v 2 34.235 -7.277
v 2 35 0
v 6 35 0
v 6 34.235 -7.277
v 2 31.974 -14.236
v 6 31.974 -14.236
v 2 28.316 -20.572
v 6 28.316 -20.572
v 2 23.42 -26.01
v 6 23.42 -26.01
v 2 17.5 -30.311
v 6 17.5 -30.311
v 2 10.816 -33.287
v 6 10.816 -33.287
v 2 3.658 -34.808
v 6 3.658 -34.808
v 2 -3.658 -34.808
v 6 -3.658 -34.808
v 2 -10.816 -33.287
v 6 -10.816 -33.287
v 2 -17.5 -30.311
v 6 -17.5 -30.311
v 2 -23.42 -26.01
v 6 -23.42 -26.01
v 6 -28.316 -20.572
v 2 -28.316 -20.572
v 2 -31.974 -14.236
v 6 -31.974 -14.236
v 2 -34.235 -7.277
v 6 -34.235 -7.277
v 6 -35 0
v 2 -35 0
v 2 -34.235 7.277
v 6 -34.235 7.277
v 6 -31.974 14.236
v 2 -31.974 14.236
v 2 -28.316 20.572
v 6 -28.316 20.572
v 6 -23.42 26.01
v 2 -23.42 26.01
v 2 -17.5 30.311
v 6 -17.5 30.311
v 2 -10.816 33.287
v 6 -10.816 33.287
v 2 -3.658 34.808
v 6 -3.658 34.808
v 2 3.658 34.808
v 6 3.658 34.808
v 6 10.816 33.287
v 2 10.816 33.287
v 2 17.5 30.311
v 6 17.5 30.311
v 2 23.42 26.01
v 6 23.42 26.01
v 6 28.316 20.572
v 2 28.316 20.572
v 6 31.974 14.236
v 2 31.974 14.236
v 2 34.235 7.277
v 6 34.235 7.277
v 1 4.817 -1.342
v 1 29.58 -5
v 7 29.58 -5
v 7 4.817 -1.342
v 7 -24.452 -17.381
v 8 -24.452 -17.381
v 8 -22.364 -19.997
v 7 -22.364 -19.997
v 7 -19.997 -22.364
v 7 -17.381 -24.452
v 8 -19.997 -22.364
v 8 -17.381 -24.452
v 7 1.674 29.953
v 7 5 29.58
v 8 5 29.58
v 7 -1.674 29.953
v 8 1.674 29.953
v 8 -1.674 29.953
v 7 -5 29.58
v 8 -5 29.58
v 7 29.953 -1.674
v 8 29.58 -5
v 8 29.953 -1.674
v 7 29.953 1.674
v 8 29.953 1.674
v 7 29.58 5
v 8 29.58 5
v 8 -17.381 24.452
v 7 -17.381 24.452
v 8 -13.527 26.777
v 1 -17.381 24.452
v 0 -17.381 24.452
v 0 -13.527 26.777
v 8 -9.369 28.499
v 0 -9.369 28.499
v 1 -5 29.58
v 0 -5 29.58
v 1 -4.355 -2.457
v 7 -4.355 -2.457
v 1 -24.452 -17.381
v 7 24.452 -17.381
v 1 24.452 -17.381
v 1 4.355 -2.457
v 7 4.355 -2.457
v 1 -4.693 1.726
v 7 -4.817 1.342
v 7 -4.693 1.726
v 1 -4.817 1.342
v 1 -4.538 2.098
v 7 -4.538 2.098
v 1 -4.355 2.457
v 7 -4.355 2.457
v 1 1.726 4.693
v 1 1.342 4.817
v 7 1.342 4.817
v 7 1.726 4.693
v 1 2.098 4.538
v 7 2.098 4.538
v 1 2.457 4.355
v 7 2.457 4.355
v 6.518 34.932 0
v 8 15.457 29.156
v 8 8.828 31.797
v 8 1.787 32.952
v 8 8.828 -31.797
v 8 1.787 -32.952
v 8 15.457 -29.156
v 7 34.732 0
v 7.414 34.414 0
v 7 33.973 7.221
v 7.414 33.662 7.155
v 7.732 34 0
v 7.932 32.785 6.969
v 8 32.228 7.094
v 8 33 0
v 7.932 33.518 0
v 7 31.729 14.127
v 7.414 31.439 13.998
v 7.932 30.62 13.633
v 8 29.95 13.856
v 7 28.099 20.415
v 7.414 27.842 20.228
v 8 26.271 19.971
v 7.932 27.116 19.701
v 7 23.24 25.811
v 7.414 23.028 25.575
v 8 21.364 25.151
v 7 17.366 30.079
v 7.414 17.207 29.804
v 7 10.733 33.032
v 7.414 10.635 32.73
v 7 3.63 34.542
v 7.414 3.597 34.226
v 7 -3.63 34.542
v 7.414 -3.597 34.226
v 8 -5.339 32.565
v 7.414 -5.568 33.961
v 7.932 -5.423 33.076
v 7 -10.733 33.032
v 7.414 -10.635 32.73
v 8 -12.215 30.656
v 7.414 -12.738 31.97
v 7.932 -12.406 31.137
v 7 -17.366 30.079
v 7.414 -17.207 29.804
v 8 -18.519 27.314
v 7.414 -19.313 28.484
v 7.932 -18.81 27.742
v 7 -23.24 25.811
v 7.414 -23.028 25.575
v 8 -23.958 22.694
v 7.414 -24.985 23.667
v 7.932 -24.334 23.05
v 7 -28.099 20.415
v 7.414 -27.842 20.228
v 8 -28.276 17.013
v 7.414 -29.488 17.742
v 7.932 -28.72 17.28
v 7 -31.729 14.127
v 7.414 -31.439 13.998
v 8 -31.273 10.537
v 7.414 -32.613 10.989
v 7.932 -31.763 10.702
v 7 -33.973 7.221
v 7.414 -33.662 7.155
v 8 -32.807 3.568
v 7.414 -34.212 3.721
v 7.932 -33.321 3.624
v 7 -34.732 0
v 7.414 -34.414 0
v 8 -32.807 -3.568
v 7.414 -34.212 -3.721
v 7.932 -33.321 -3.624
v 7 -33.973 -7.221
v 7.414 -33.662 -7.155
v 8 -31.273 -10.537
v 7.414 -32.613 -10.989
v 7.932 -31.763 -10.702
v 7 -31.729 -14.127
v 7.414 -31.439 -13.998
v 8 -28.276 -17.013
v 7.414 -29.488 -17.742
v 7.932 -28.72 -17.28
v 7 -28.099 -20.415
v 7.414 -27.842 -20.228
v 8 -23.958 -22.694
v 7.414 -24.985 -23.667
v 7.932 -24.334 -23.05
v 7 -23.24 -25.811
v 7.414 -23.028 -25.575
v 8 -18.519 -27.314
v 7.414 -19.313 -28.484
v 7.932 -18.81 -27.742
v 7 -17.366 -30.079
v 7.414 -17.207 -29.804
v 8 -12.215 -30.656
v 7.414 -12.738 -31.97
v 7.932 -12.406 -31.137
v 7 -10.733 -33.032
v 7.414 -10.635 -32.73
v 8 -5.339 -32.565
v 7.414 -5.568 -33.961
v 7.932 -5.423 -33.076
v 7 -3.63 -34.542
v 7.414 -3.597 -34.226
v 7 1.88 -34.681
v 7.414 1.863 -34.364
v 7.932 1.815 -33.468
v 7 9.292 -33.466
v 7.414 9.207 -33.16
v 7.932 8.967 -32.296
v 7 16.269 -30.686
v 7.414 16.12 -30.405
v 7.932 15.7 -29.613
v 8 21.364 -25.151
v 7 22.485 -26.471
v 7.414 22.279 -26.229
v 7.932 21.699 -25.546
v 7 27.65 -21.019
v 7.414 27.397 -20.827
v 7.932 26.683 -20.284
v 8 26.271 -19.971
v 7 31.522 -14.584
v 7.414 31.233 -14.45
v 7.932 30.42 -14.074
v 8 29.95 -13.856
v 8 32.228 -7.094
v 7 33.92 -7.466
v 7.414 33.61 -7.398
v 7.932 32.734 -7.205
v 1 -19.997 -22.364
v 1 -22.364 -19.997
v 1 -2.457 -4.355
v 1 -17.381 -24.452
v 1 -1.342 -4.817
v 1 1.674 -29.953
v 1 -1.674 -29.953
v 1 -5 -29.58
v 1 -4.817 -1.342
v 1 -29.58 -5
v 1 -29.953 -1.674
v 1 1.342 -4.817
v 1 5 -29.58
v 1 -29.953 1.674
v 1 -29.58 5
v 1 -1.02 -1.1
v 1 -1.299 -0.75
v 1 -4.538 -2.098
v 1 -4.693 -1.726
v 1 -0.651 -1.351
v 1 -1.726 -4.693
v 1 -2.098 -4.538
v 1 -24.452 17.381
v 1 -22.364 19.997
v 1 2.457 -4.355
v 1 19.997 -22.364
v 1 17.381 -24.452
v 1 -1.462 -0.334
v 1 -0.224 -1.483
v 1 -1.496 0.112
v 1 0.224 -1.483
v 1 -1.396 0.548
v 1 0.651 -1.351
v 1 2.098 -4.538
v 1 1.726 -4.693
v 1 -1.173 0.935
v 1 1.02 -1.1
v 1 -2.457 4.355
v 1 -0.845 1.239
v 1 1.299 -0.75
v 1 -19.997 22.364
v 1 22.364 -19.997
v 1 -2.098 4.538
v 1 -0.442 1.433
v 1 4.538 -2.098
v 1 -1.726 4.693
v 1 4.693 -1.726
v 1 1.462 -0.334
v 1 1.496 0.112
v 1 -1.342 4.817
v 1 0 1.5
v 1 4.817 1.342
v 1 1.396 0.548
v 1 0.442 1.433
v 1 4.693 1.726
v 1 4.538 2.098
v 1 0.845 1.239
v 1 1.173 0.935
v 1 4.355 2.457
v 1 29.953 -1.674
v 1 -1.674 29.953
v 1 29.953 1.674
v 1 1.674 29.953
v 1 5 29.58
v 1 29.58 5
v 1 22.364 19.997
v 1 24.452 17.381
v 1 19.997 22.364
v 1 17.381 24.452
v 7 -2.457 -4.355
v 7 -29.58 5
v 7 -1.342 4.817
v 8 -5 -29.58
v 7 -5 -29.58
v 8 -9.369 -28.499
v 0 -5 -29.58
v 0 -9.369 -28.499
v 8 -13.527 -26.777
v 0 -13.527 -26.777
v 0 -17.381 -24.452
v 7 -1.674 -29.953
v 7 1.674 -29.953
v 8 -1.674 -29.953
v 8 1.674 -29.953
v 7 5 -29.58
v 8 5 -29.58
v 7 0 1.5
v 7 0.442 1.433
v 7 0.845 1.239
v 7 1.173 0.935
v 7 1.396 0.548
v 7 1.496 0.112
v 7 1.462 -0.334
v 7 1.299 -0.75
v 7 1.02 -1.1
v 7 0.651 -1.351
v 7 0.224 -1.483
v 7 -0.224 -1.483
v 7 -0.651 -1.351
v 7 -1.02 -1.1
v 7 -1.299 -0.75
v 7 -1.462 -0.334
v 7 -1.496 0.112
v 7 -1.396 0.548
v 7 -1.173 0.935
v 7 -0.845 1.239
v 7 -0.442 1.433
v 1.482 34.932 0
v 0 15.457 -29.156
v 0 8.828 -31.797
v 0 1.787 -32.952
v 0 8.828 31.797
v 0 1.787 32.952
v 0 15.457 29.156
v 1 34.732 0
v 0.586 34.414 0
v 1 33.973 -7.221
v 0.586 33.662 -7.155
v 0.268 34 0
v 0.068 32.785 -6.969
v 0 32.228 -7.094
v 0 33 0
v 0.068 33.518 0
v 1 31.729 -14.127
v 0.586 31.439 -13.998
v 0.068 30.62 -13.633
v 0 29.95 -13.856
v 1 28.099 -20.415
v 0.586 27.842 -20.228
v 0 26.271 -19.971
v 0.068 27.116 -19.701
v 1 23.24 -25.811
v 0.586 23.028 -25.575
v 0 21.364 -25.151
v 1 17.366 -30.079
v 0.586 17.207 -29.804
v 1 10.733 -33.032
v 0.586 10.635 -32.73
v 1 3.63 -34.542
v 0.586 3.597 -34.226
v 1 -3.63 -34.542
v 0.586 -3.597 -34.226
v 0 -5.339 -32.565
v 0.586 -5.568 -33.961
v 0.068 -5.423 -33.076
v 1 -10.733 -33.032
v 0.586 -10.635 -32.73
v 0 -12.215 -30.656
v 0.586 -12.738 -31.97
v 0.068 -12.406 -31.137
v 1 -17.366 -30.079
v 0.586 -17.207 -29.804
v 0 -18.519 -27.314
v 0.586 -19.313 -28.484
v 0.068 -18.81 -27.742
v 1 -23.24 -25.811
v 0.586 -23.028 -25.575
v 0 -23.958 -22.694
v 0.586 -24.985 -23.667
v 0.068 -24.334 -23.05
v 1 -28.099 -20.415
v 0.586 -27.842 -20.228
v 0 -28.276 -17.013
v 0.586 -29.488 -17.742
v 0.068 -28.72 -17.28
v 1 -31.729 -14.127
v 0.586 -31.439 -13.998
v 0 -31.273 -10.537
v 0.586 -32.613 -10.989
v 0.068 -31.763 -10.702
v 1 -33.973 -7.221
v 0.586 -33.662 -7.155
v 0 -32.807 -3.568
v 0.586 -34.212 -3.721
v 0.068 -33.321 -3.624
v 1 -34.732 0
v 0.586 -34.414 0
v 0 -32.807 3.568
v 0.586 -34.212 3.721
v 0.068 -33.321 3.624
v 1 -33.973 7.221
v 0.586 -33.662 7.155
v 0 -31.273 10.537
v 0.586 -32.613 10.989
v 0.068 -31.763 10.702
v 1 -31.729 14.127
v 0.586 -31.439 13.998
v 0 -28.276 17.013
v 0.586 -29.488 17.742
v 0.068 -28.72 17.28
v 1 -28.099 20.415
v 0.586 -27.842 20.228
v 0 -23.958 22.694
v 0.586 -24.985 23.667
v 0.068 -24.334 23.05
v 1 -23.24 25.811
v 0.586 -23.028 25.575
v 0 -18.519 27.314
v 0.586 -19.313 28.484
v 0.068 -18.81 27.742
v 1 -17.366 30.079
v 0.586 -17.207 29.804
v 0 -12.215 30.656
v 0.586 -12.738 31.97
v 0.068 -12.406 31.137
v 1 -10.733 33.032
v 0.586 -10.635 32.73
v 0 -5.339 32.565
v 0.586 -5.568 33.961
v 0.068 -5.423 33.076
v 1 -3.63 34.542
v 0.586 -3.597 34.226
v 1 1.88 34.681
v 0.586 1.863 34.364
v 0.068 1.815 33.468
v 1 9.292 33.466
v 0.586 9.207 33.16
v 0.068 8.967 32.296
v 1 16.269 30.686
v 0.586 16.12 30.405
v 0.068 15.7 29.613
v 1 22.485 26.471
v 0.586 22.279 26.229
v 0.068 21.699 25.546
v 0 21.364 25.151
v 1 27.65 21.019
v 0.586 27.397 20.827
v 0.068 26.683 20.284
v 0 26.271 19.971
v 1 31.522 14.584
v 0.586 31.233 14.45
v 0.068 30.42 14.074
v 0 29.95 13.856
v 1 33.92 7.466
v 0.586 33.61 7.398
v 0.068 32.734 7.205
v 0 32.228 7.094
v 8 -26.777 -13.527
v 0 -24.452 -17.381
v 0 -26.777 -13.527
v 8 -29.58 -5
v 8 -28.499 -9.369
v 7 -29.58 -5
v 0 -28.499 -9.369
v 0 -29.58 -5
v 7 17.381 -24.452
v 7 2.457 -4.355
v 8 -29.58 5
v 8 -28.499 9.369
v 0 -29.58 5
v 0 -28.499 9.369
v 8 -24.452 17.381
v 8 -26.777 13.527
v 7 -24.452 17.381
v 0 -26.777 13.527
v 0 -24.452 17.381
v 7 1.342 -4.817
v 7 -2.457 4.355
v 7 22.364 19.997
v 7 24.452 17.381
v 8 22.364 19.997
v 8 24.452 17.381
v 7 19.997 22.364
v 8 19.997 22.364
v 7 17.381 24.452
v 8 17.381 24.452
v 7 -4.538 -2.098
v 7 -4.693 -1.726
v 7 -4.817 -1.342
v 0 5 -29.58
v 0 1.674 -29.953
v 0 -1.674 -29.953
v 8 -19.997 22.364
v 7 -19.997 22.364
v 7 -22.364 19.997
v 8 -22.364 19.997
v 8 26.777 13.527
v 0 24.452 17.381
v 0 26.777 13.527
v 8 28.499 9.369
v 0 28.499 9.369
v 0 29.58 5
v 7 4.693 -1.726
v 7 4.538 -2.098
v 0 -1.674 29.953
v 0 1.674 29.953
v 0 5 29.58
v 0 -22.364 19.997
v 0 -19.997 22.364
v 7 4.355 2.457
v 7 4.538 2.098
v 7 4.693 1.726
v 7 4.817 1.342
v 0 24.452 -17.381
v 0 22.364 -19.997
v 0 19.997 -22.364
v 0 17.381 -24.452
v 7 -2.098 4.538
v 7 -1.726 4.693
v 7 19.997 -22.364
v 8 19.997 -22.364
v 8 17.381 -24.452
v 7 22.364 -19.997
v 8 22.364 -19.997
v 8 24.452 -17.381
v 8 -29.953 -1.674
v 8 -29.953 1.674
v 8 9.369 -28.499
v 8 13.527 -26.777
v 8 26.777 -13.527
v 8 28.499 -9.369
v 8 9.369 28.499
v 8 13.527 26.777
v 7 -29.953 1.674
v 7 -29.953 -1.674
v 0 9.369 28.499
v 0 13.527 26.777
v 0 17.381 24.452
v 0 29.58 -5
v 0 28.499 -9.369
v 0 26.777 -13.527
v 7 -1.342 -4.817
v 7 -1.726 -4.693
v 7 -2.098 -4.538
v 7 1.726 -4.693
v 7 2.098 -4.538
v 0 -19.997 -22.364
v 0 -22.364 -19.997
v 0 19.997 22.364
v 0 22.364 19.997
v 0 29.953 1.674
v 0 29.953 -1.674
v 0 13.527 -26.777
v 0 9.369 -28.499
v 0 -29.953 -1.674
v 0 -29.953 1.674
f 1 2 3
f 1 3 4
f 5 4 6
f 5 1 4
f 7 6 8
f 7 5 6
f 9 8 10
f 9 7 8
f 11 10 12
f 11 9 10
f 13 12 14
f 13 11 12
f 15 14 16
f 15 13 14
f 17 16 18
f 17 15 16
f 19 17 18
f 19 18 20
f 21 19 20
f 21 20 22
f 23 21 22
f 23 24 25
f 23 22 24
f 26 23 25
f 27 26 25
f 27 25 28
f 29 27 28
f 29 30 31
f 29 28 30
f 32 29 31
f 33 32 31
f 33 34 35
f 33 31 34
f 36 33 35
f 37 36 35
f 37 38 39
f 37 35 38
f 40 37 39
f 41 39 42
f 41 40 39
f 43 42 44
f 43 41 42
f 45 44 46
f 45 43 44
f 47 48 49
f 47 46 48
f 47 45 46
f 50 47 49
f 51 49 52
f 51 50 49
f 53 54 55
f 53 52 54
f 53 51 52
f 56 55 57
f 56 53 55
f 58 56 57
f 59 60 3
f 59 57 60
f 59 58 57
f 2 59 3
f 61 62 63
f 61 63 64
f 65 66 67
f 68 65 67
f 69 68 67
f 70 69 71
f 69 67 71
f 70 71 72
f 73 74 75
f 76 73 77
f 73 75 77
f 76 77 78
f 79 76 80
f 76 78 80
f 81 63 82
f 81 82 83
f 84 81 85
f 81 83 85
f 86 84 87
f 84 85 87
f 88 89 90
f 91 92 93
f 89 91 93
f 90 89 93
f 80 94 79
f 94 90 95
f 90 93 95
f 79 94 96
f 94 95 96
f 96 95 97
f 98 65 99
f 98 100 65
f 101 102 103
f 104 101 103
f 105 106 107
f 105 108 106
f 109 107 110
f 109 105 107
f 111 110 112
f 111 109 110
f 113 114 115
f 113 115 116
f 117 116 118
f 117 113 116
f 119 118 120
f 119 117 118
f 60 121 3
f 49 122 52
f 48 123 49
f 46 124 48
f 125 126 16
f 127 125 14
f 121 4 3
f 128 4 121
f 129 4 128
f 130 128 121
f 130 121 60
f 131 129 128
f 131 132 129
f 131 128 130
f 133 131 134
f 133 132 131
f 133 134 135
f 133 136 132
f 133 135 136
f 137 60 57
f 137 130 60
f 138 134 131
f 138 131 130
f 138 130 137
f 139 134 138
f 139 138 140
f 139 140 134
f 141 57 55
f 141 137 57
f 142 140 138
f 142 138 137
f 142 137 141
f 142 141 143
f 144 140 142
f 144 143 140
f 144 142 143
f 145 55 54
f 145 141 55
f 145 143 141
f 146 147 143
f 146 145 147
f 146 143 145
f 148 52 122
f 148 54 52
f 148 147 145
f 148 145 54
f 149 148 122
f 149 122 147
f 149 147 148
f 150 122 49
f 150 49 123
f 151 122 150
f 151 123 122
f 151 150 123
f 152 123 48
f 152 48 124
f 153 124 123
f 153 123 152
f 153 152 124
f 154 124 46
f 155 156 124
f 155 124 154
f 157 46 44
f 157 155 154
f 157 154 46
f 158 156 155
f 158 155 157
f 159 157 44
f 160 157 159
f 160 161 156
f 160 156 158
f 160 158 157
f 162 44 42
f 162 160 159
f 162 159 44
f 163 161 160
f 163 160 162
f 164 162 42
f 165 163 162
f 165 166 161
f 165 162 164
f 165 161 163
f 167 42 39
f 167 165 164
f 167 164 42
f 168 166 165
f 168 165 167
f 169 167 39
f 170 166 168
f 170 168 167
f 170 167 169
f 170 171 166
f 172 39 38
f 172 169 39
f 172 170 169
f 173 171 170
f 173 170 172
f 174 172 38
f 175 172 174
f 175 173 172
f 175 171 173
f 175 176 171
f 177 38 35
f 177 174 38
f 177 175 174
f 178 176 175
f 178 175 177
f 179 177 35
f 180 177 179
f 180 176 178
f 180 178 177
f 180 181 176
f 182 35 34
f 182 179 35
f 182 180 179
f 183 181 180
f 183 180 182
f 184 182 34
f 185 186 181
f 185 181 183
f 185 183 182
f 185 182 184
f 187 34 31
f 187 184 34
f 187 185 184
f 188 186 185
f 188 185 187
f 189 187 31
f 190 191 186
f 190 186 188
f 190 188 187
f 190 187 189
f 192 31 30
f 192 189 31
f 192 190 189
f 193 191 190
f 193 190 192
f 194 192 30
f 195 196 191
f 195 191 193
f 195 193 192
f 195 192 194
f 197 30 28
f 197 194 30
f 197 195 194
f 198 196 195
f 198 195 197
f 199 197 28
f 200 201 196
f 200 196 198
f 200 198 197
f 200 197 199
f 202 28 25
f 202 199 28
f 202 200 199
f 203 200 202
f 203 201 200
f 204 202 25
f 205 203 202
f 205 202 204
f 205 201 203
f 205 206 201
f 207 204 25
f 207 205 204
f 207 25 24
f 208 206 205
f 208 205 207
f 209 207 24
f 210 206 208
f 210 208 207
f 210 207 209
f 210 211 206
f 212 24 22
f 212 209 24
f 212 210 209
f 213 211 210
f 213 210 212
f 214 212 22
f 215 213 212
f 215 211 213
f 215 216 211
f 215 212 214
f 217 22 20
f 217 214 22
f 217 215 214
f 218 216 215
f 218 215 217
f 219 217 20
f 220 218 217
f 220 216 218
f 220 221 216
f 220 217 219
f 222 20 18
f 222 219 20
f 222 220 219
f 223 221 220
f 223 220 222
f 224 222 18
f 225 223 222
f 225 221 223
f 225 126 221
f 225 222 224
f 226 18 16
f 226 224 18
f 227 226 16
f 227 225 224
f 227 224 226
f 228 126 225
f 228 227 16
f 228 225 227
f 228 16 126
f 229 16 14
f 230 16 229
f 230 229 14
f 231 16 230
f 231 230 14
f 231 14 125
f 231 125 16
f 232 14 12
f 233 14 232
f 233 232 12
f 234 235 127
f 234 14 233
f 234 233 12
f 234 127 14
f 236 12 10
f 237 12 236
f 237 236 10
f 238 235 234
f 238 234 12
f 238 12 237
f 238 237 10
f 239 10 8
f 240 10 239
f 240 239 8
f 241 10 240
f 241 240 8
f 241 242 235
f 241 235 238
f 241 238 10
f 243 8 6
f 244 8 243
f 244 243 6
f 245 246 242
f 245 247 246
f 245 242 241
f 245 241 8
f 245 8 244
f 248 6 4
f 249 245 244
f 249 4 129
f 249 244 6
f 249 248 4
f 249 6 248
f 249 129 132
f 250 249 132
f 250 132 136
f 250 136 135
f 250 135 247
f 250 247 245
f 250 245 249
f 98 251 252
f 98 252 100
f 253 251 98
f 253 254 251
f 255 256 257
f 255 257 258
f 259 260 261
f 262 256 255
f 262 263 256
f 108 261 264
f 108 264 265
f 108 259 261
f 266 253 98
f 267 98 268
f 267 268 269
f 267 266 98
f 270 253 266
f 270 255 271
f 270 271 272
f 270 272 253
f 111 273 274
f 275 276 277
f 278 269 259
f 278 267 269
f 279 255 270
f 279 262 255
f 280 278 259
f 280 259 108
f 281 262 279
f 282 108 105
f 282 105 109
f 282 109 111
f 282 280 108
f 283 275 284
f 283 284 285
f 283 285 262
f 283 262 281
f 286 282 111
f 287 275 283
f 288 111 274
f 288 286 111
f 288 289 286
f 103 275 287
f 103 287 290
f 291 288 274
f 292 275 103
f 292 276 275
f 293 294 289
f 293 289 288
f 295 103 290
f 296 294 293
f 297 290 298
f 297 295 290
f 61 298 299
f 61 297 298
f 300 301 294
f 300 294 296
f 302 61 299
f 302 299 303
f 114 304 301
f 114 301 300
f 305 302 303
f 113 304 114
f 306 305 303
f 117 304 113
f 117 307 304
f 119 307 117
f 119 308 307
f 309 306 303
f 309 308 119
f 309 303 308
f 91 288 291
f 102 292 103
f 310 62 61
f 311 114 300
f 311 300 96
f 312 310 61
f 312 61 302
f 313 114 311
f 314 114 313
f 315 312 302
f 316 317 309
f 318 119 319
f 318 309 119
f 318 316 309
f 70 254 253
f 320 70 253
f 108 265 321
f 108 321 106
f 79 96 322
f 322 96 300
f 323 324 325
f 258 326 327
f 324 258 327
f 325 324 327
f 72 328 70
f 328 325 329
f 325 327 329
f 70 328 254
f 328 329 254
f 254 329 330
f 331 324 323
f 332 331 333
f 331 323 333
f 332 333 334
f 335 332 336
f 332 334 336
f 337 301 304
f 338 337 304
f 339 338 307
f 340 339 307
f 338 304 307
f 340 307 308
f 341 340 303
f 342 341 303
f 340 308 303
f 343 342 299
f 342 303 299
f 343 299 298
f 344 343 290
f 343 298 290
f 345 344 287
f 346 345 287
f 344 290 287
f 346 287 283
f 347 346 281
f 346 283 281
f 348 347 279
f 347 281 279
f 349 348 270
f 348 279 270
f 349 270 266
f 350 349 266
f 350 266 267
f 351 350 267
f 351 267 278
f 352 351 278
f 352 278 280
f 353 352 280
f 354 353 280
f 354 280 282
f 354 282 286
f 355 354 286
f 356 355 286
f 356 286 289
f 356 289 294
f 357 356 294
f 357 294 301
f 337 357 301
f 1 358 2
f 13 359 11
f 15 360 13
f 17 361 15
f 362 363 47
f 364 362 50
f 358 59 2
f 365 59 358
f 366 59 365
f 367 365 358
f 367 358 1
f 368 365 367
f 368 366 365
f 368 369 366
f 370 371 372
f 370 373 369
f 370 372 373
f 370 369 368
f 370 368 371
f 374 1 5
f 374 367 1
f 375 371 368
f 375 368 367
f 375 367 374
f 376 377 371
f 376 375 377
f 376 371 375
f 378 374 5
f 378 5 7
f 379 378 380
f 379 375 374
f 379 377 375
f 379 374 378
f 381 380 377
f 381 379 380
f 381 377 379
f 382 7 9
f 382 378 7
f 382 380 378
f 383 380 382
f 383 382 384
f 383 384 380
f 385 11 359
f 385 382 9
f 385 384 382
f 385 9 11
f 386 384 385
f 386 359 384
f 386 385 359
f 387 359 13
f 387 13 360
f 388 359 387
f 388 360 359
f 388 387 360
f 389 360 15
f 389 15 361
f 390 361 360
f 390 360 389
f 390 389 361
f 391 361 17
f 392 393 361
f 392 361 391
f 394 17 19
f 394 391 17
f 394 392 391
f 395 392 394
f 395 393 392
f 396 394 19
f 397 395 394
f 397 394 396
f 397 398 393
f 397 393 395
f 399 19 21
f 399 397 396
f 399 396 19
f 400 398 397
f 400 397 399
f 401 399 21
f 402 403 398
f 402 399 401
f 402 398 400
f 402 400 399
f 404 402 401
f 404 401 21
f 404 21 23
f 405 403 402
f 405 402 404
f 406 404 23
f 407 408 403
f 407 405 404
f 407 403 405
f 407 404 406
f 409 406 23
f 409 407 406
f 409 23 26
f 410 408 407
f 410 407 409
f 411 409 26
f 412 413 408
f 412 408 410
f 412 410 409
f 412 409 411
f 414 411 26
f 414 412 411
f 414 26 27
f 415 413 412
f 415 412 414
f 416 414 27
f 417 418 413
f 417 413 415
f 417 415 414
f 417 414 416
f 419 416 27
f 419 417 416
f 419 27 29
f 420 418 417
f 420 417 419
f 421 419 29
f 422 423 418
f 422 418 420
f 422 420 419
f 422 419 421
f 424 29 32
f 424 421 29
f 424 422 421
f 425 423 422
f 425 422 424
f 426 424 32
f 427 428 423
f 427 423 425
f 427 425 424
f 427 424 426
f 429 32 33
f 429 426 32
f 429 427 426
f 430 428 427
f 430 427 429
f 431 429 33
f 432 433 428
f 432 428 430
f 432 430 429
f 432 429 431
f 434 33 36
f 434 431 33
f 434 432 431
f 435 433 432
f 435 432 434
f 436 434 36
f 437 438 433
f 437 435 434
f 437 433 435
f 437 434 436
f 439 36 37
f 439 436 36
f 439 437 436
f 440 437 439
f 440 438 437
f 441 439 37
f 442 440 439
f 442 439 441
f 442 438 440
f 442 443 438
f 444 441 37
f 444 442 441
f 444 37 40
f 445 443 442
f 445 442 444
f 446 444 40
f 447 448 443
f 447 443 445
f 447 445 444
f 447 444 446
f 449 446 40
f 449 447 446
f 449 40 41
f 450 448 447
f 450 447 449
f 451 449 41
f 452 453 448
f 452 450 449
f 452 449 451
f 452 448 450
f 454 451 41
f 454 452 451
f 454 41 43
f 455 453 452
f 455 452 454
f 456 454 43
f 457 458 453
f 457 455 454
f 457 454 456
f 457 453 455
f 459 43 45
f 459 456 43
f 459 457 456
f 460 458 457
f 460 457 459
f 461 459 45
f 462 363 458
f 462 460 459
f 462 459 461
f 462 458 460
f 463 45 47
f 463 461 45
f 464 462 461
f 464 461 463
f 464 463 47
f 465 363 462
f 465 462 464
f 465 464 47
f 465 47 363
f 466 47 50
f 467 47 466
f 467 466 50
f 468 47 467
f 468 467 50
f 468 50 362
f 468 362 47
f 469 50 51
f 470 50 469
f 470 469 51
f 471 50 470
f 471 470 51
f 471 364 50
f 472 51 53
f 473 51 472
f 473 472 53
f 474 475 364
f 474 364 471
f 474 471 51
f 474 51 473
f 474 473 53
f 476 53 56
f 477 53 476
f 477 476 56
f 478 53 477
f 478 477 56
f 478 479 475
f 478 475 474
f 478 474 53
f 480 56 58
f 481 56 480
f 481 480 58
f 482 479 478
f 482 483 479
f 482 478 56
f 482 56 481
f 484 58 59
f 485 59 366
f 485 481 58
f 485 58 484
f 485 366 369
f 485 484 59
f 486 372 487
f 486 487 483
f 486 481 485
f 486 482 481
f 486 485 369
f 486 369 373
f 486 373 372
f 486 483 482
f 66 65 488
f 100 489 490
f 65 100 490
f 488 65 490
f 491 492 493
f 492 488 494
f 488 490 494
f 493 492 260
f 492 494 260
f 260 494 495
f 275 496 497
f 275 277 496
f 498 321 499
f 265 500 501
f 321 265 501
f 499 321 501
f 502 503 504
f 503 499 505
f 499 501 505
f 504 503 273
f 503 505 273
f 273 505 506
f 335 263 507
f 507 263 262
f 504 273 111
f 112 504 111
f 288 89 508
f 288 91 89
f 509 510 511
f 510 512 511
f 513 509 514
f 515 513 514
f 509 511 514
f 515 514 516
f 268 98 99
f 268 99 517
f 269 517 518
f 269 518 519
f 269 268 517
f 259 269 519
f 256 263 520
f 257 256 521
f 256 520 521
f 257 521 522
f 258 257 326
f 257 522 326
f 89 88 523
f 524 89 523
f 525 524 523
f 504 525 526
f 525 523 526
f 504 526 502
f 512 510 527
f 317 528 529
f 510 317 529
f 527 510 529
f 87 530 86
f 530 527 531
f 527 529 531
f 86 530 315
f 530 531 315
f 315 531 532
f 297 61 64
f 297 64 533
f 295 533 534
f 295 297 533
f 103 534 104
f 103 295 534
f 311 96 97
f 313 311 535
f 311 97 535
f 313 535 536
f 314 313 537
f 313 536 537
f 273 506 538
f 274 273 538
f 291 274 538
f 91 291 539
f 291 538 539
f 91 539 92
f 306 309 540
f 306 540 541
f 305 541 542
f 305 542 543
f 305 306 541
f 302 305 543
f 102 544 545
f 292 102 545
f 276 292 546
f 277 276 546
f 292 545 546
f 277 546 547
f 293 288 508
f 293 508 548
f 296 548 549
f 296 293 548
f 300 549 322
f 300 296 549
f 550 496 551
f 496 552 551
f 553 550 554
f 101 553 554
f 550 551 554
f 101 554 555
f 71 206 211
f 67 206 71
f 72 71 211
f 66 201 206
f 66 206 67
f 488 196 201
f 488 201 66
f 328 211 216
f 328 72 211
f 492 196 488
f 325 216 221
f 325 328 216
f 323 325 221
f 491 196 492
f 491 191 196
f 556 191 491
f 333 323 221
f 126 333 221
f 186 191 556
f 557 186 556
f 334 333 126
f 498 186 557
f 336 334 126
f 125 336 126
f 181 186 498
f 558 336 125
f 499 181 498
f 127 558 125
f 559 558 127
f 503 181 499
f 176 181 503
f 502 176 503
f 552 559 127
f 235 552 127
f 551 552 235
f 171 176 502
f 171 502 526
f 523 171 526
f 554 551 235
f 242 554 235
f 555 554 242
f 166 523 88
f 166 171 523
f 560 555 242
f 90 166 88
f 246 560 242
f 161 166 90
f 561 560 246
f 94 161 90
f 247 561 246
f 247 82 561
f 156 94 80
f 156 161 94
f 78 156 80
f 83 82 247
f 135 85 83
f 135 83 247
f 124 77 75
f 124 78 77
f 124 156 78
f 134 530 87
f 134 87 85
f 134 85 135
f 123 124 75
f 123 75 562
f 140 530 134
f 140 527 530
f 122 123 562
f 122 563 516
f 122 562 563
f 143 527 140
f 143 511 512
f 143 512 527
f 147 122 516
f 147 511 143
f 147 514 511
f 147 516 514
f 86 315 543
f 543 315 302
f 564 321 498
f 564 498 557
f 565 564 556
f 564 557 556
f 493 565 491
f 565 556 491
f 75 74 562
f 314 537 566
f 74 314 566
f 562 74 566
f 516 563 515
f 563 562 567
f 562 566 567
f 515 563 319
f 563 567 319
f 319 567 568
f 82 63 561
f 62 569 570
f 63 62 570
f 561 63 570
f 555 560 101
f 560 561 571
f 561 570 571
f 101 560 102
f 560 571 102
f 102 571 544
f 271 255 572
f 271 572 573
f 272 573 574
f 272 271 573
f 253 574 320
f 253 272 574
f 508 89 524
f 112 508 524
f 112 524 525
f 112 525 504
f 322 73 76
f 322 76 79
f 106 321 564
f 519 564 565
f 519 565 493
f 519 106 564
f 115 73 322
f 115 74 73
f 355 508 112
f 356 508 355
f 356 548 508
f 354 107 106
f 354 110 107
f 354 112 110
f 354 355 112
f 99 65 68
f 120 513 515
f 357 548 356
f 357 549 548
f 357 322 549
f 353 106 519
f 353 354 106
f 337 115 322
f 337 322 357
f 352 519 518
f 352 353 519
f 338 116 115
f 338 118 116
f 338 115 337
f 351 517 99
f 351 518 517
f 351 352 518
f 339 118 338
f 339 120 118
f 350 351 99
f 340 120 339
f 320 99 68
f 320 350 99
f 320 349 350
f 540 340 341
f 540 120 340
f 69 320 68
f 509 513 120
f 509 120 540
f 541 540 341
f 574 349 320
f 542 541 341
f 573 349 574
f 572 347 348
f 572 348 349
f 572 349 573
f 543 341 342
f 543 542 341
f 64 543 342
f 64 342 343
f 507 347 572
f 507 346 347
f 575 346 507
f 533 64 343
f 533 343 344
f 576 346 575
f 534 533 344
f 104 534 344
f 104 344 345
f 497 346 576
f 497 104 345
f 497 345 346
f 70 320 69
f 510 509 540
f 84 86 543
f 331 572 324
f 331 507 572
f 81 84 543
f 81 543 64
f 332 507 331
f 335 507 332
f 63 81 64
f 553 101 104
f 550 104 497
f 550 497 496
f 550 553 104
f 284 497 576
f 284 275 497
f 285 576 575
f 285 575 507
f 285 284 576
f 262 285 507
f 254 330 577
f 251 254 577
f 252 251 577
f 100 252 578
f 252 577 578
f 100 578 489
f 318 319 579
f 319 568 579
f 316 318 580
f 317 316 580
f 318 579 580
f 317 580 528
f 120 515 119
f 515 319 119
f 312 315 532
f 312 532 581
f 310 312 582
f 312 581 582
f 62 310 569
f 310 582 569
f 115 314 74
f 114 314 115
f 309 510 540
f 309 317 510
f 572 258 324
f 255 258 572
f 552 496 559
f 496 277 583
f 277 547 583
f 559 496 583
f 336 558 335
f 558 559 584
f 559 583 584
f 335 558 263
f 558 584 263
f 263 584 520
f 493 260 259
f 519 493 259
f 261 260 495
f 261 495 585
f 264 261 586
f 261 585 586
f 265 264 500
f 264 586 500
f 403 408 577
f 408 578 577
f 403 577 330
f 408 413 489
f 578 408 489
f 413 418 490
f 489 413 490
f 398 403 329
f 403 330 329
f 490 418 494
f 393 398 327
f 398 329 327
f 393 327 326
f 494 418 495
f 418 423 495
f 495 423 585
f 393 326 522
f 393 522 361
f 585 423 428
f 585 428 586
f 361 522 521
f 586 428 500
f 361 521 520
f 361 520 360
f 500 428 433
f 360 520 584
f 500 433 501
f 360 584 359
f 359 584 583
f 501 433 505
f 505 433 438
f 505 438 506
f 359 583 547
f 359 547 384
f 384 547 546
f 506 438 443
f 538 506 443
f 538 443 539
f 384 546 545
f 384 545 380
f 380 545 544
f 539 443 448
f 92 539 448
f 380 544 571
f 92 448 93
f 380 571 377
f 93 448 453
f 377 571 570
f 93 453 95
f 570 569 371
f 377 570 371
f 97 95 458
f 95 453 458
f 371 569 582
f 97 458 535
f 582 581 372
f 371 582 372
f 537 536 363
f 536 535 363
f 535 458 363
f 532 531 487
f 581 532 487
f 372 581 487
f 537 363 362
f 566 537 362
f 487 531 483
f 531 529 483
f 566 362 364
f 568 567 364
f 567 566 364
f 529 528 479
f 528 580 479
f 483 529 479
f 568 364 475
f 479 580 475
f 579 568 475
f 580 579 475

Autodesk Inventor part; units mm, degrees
ref_plane "YZ Plane" through (0, 0, 0) normal (1, 0, 0) x (0, 1, 0)
ref_plane "XZ Plane" through (0, 0, 0) normal (0, 1, 0) x (-1, 0, 0)
ref_plane "XY Plane" through (0, 0, 0) normal (0, 0, 1) x (1, 0, 0)
sketch "Sketch1" plane through (0, 0, 0) normal (1, 0, 0) x (0, 1, 0)
  circle A0 centre (0, 0) radius 35
  line L0 (29.5804, -5) -> (4.8166, -1.3417)
  line L1 (36.6755, 0) -> (35, 0)
  line L2 (29.5804, 5) -> (4.8166, 1.3417)
  line L3 (17.381, 24.452) -> (2.4572, 4.3546)
  line L4 (24.452, 17.381) -> (4.3546, 2.4572)
  line L5 (-5, 29.5804) -> (-1.3417, 4.8166)
  line L6 (5, 29.5804) -> (1.3417, 4.8166)
  line L7 (-24.452, 17.381) -> (-4.3546, 2.4572)
  line L8 (-17.381, 24.452) -> (-2.4572, 4.3546)
  line L9 (-29.5804, -5) -> (-4.8166, -1.3417)
  line L10 (-29.5804, 5) -> (-4.8166, 1.3417)
  line L11 (-17.381, -24.452) -> (-2.4572, -4.3546)
  line L12 (-24.452, -17.381) -> (-4.3546, -2.4572)
  line L13 (5, -29.5804) -> (1.3417, -4.8166)
  line L14 (-5, -29.5804) -> (-1.3417, -4.8166)
  line L15 (24.452, -17.381) -> (4.3546, -2.4572)
  line L16 (17.381, -24.452) -> (2.4572, -4.3546)
  arc A1 (4.8166, 1.3417) -> (4.3546, 2.4572) centre (0, 0) ccw
  arc A2 (2.4572, 4.3546) -> (1.3417, 4.8166) centre (0, 0) ccw
  arc A3 (-1.3417, 4.8166) -> (-2.4572, 4.3546) centre (0, 0) ccw
  arc A4 (-4.3546, 2.4572) -> (-4.8166, 1.3417) centre (0, 0) ccw
  arc A5 (-4.8166, -1.3417) -> (-4.3546, -2.4572) centre (0, 0) ccw
  arc A6 (-2.4572, -4.3546) -> (-1.3417, -4.8166) centre (0, 0) ccw
  arc A7 (1.3417, -4.8166) -> (2.4572, -4.3546) centre (0, 0) ccw
  arc A8 (4.3546, -2.4572) -> (4.8166, -1.3417) centre (0, 0) ccw
  arc A9 (29.5804, 5) -> (24.452, 17.381) centre (0, 0) ccw
  arc A10 (24.452, -17.381) -> (29.5804, -5) centre (0, 0) ccw
  arc A11 (5, -29.5804) -> (17.381, -24.452) centre (0, 0) ccw
  arc A12 (-17.381, -24.452) -> (-5, -29.5804) centre (0, 0) ccw
  arc A13 (-29.5804, -5) -> (-24.452, -17.381) centre (0, 0) ccw
  arc A14 (-24.452, 17.381) -> (-29.5804, 5) centre (0, 0) ccw
  arc A15 (17.381, 24.452) -> (5, 29.5804) centre (0, 0) ccw
  arc A16 (-5, 29.5804) -> (-17.381, 24.452) centre (0, 0) ccw
  dimension "d0" = 70
extrude "Extrusion1" add sketch "Sketch1" along normal blind 8
sketch "Sketch2" plane through (8, 0, 0) normal (1, 0, 0) x (0, 0, -1)
  circle A0 centre (0, 0) radius 30
  dimension "d9" = 60
extrude "Extrusion2" cut sketch "Sketch2" against normal blind 1
sketch "Sketch3" plane through (0, 0, 0) normal (-1, 0, 0) x (0, 0, 1)
  circle A0 centre (0, 0) radius 30
extrude "Extrusion3" cut sketch "Sketch3" against normal blind 1
fillet "Fillet1" radius 2 2 edges at (0, -35, 0) (8, -35, 0)
sketch "Sketch4" plane through (1, 0, 0) normal (-1, 0, 0) x (0, 0, 1)
  circle A0 centre (0, 0) radius 1.5
  dimension "d15" = 3
extrude "Extrusion4" cut sketch "Sketch4" against normal blind 10
properties part number "Wheel"
